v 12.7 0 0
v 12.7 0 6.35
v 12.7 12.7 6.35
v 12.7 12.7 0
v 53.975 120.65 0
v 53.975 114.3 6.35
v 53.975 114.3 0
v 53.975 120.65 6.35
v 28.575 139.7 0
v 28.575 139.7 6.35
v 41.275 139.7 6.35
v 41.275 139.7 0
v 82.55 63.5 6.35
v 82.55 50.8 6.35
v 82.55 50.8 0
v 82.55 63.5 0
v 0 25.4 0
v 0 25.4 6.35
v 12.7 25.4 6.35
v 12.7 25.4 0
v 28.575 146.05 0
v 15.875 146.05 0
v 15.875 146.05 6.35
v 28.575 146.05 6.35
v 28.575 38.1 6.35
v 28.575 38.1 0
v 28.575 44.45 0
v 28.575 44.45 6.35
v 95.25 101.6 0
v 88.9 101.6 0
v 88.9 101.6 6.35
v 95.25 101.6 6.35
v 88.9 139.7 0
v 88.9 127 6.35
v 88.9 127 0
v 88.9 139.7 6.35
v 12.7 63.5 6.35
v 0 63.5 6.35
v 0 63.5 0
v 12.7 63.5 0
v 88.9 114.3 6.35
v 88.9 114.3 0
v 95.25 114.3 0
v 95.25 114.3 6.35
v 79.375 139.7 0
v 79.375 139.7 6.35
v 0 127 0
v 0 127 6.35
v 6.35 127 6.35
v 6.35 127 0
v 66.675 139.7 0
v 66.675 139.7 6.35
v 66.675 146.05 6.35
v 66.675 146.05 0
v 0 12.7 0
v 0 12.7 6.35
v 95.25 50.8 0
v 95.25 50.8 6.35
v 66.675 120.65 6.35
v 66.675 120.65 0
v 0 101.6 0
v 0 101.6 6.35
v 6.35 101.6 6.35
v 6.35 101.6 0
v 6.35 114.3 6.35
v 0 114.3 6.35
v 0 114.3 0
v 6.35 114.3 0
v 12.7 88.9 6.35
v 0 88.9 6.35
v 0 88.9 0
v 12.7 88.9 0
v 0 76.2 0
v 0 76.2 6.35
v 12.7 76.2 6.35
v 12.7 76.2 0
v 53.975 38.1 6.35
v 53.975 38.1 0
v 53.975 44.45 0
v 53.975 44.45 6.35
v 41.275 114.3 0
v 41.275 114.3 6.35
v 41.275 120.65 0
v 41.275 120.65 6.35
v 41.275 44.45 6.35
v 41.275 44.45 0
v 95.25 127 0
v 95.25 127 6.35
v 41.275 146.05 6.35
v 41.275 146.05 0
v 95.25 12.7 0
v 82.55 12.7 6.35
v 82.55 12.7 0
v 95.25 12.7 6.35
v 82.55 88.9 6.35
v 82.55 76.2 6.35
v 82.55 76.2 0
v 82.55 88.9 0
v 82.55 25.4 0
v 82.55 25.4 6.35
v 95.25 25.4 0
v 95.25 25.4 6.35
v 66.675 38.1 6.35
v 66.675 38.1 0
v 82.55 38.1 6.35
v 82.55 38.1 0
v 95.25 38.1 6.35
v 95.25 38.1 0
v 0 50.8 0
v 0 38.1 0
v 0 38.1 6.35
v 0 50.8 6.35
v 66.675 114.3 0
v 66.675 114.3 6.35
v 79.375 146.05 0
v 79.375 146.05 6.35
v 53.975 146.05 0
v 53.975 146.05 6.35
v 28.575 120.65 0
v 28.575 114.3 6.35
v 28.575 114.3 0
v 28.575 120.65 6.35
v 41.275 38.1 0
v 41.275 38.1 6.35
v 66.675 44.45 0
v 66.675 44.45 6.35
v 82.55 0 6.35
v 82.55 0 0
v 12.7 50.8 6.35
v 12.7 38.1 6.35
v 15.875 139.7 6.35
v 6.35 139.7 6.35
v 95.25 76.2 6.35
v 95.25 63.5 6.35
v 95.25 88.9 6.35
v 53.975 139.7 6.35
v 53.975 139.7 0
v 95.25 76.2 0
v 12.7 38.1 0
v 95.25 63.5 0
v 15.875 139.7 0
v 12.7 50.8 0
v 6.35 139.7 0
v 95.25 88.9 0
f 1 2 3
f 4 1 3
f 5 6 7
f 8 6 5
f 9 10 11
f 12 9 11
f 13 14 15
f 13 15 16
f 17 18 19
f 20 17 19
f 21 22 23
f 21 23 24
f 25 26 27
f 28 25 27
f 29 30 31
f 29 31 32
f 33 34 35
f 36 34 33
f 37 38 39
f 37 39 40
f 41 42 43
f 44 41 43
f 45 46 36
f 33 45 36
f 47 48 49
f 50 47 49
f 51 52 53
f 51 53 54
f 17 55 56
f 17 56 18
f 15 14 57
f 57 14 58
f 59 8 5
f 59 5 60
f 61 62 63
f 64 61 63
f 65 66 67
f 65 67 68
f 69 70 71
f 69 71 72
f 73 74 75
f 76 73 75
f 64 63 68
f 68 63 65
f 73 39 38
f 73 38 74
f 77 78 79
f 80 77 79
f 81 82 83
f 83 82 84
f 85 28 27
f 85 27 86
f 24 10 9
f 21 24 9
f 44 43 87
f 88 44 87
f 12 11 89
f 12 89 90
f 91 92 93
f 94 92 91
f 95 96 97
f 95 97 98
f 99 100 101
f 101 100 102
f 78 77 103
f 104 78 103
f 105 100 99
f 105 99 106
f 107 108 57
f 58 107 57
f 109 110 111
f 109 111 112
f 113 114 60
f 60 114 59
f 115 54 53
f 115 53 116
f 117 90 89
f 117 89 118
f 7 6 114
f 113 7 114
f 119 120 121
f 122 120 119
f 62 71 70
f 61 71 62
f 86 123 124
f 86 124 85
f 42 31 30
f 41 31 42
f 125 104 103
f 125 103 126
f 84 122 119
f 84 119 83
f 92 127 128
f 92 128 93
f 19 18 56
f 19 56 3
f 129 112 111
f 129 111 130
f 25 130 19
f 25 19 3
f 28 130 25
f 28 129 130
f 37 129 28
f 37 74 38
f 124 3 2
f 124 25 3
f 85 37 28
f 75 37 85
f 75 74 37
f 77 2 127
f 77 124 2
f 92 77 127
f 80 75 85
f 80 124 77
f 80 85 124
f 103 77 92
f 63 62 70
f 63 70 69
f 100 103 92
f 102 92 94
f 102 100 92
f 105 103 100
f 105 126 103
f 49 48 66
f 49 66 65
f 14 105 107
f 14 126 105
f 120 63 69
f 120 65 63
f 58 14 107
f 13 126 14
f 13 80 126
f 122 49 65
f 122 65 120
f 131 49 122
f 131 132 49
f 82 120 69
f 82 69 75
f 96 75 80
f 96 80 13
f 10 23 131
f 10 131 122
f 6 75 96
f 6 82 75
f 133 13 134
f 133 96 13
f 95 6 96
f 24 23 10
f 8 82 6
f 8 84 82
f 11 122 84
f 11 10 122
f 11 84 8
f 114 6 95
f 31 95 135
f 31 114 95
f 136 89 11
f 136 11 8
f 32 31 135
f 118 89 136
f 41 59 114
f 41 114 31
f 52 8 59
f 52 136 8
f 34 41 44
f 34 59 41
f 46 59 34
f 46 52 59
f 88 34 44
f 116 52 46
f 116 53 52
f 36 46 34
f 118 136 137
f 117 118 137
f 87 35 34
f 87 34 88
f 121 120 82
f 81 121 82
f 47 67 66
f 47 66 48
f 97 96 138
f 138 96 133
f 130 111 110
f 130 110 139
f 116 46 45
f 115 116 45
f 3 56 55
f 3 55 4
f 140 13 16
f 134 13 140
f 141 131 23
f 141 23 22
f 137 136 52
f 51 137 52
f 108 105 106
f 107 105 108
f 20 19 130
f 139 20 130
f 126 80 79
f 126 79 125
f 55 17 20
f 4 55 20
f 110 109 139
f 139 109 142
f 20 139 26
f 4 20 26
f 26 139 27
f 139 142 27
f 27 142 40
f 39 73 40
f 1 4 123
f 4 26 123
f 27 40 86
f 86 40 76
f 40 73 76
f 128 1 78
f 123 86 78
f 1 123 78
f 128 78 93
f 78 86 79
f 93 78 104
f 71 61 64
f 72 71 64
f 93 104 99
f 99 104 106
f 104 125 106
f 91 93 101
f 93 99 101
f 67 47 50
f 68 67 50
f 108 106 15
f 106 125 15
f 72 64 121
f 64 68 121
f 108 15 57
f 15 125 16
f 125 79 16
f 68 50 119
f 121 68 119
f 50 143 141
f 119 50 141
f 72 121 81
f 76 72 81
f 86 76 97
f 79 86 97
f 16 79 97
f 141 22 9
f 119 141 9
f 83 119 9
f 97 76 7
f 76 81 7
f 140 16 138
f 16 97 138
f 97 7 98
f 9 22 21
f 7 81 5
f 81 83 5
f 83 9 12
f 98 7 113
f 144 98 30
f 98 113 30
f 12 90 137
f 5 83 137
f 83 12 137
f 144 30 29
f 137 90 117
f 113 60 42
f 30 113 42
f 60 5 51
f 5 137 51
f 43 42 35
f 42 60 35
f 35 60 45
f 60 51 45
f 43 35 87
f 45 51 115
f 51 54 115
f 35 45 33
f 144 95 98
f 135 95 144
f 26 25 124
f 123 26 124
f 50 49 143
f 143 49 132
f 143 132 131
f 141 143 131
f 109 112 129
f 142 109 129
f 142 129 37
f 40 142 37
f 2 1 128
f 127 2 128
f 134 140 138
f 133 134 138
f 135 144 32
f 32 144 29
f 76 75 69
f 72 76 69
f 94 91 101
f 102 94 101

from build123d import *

# Parameters (mm, degrees)
SKETCH1_W           = 95.25
SKETCH1_H           = 177.8
BOSS_EXTRUDE1_DEPTH = 6.35
SKETCH2_W           = 12.7
SKETCH2_H           = 12.7
CUT_EXTRUDE1_DEPTH  = 7.35
LPATTERN1_COUNT     = 4
LPATTERN1_PITCH     = 25.4
SKETCH3_W           = 12.7
SKETCH3_H           = 6.35
CUT_EXTRUDE2_DEPTH  = 7.35
SKETCH5_W           = 6.35
SKETCH5_H           = 12.7
CUT_EXTRUDE4_DEPTH  = 7.35
LPATTERN2_COUNT     = 4
LPATTERN2_PITCH     = 25.4
SKETCH6_W           = 95.25
SKETCH6_H           = 38.1
CUT_EXTRUDE5_DEPTH  = 7.35
SKETCH7_W           = 12.7
SKETCH7_H           = 6.35
BOSS_EXTRUDE2_DEPTH = 6.35
LPATTERN3_COUNT     = 2
LPATTERN3_PITCH     = 25.4
LPATTERN3_COL_COUNT = 2
LPATTERN3_COL_PITCH = 25.4
LPATTERN4_COUNT     = 2
LPATTERN4_PITCH     = 76.2


with BuildPart() as part:
    # Sketch1 → Boss-Extrude1 (new body)
    with BuildSketch(Plane.XY):
        with Locations((47.625, 88.9)):
            Rectangle(SKETCH1_W, SKETCH1_H)
    extrude(amount=BOSS_EXTRUDE1_DEPTH)

    # Sketch2 → Cut-Extrude1 (cut, through all)
    with BuildSketch(Plane.XY.offset(6.35)):
        with Locations((6.35, 6.35)):
            Rectangle(SKETCH2_W, SKETCH2_H)
        with Locations((88.9, 6.35)):
            Rectangle(SKETCH2_W, SKETCH2_H)
    cut_extrude1 = extrude(amount=-CUT_EXTRUDE1_DEPTH, mode=Mode.SUBTRACT)

    # LPattern1: Cut-Extrude1 ×4
    with Locations(*[(0, i * LPATTERN1_PITCH, 0) for i in range(1, LPATTERN1_COUNT)]):
        add(cut_extrude1, mode=Mode.SUBTRACT)

    # Sketch3 → Cut-Extrude2 (cut, through all)
    with BuildSketch(Plane.XY.offset(6.35)):
        with Locations((34.925, 41.275)):
            Rectangle(SKETCH3_W, SKETCH3_H)
        with Locations((60.325, 41.275)):
            Rectangle(SKETCH3_W, SKETCH3_H)
    cut_extrude2 = extrude(amount=-CUT_EXTRUDE2_DEPTH, mode=Mode.SUBTRACT)

    # Sketch5 → Cut-Extrude4 (cut, through all)
    with BuildSketch(Plane.XY.offset(6.35)):
        with Locations((3.175, 107.95)):
            Rectangle(SKETCH5_W, SKETCH5_H)
        with Locations((92.075, 107.95)):
            Rectangle(SKETCH5_W, SKETCH5_H)
    cut_extrude4 = extrude(amount=-CUT_EXTRUDE4_DEPTH, mode=Mode.SUBTRACT)

    # LPattern2: Cut-Extrude4 ×4
    with Locations(*[(0, i * LPATTERN2_PITCH, 0) for i in range(1, LPATTERN2_COUNT)]):
        add(cut_extrude4, mode=Mode.SUBTRACT)

    # Sketch6 → Cut-Extrude5 (cut, through all)
    with BuildSketch(Plane.XY.offset(6.35)):
        with Locations((47.625, 158.75)):
            Rectangle(SKETCH6_W, SKETCH6_H)
    extrude(amount=-CUT_EXTRUDE5_DEPTH, mode=Mode.SUBTRACT)

    # Sketch7 → Boss-Extrude2 (add)
    with BuildSketch(Plane(origin=(0, 139.7, 0), x_dir=(1, 0, 0), z_dir=(0, 1, 0))):
        with Locations((47.625, -3.175)):
            Rectangle(SKETCH7_W, SKETCH7_H)
    boss_extrude2 = extrude(amount=BOSS_EXTRUDE2_DEPTH)

    # LPattern3: Boss-Extrude2 ×2
    with Locations(*[(i * LPATTERN3_PITCH, 0, 0) for i in range(1, LPATTERN3_COUNT)]):
        add(boss_extrude2)

    # LPattern3 col: Boss-Extrude2 ×2
    with Locations(*[(-i * LPATTERN3_COL_PITCH, 0, 0) for i in range(1, LPATTERN3_COL_COUNT)]):
        add(boss_extrude2)

    # LPattern4: Cut-Extrude2 ×2
    with Locations(*[(0, i * LPATTERN4_PITCH, 0) for i in range(1, LPATTERN4_COUNT)]):
        add(cut_extrude2, mode=Mode.SUBTRACT)


solid = part.part
